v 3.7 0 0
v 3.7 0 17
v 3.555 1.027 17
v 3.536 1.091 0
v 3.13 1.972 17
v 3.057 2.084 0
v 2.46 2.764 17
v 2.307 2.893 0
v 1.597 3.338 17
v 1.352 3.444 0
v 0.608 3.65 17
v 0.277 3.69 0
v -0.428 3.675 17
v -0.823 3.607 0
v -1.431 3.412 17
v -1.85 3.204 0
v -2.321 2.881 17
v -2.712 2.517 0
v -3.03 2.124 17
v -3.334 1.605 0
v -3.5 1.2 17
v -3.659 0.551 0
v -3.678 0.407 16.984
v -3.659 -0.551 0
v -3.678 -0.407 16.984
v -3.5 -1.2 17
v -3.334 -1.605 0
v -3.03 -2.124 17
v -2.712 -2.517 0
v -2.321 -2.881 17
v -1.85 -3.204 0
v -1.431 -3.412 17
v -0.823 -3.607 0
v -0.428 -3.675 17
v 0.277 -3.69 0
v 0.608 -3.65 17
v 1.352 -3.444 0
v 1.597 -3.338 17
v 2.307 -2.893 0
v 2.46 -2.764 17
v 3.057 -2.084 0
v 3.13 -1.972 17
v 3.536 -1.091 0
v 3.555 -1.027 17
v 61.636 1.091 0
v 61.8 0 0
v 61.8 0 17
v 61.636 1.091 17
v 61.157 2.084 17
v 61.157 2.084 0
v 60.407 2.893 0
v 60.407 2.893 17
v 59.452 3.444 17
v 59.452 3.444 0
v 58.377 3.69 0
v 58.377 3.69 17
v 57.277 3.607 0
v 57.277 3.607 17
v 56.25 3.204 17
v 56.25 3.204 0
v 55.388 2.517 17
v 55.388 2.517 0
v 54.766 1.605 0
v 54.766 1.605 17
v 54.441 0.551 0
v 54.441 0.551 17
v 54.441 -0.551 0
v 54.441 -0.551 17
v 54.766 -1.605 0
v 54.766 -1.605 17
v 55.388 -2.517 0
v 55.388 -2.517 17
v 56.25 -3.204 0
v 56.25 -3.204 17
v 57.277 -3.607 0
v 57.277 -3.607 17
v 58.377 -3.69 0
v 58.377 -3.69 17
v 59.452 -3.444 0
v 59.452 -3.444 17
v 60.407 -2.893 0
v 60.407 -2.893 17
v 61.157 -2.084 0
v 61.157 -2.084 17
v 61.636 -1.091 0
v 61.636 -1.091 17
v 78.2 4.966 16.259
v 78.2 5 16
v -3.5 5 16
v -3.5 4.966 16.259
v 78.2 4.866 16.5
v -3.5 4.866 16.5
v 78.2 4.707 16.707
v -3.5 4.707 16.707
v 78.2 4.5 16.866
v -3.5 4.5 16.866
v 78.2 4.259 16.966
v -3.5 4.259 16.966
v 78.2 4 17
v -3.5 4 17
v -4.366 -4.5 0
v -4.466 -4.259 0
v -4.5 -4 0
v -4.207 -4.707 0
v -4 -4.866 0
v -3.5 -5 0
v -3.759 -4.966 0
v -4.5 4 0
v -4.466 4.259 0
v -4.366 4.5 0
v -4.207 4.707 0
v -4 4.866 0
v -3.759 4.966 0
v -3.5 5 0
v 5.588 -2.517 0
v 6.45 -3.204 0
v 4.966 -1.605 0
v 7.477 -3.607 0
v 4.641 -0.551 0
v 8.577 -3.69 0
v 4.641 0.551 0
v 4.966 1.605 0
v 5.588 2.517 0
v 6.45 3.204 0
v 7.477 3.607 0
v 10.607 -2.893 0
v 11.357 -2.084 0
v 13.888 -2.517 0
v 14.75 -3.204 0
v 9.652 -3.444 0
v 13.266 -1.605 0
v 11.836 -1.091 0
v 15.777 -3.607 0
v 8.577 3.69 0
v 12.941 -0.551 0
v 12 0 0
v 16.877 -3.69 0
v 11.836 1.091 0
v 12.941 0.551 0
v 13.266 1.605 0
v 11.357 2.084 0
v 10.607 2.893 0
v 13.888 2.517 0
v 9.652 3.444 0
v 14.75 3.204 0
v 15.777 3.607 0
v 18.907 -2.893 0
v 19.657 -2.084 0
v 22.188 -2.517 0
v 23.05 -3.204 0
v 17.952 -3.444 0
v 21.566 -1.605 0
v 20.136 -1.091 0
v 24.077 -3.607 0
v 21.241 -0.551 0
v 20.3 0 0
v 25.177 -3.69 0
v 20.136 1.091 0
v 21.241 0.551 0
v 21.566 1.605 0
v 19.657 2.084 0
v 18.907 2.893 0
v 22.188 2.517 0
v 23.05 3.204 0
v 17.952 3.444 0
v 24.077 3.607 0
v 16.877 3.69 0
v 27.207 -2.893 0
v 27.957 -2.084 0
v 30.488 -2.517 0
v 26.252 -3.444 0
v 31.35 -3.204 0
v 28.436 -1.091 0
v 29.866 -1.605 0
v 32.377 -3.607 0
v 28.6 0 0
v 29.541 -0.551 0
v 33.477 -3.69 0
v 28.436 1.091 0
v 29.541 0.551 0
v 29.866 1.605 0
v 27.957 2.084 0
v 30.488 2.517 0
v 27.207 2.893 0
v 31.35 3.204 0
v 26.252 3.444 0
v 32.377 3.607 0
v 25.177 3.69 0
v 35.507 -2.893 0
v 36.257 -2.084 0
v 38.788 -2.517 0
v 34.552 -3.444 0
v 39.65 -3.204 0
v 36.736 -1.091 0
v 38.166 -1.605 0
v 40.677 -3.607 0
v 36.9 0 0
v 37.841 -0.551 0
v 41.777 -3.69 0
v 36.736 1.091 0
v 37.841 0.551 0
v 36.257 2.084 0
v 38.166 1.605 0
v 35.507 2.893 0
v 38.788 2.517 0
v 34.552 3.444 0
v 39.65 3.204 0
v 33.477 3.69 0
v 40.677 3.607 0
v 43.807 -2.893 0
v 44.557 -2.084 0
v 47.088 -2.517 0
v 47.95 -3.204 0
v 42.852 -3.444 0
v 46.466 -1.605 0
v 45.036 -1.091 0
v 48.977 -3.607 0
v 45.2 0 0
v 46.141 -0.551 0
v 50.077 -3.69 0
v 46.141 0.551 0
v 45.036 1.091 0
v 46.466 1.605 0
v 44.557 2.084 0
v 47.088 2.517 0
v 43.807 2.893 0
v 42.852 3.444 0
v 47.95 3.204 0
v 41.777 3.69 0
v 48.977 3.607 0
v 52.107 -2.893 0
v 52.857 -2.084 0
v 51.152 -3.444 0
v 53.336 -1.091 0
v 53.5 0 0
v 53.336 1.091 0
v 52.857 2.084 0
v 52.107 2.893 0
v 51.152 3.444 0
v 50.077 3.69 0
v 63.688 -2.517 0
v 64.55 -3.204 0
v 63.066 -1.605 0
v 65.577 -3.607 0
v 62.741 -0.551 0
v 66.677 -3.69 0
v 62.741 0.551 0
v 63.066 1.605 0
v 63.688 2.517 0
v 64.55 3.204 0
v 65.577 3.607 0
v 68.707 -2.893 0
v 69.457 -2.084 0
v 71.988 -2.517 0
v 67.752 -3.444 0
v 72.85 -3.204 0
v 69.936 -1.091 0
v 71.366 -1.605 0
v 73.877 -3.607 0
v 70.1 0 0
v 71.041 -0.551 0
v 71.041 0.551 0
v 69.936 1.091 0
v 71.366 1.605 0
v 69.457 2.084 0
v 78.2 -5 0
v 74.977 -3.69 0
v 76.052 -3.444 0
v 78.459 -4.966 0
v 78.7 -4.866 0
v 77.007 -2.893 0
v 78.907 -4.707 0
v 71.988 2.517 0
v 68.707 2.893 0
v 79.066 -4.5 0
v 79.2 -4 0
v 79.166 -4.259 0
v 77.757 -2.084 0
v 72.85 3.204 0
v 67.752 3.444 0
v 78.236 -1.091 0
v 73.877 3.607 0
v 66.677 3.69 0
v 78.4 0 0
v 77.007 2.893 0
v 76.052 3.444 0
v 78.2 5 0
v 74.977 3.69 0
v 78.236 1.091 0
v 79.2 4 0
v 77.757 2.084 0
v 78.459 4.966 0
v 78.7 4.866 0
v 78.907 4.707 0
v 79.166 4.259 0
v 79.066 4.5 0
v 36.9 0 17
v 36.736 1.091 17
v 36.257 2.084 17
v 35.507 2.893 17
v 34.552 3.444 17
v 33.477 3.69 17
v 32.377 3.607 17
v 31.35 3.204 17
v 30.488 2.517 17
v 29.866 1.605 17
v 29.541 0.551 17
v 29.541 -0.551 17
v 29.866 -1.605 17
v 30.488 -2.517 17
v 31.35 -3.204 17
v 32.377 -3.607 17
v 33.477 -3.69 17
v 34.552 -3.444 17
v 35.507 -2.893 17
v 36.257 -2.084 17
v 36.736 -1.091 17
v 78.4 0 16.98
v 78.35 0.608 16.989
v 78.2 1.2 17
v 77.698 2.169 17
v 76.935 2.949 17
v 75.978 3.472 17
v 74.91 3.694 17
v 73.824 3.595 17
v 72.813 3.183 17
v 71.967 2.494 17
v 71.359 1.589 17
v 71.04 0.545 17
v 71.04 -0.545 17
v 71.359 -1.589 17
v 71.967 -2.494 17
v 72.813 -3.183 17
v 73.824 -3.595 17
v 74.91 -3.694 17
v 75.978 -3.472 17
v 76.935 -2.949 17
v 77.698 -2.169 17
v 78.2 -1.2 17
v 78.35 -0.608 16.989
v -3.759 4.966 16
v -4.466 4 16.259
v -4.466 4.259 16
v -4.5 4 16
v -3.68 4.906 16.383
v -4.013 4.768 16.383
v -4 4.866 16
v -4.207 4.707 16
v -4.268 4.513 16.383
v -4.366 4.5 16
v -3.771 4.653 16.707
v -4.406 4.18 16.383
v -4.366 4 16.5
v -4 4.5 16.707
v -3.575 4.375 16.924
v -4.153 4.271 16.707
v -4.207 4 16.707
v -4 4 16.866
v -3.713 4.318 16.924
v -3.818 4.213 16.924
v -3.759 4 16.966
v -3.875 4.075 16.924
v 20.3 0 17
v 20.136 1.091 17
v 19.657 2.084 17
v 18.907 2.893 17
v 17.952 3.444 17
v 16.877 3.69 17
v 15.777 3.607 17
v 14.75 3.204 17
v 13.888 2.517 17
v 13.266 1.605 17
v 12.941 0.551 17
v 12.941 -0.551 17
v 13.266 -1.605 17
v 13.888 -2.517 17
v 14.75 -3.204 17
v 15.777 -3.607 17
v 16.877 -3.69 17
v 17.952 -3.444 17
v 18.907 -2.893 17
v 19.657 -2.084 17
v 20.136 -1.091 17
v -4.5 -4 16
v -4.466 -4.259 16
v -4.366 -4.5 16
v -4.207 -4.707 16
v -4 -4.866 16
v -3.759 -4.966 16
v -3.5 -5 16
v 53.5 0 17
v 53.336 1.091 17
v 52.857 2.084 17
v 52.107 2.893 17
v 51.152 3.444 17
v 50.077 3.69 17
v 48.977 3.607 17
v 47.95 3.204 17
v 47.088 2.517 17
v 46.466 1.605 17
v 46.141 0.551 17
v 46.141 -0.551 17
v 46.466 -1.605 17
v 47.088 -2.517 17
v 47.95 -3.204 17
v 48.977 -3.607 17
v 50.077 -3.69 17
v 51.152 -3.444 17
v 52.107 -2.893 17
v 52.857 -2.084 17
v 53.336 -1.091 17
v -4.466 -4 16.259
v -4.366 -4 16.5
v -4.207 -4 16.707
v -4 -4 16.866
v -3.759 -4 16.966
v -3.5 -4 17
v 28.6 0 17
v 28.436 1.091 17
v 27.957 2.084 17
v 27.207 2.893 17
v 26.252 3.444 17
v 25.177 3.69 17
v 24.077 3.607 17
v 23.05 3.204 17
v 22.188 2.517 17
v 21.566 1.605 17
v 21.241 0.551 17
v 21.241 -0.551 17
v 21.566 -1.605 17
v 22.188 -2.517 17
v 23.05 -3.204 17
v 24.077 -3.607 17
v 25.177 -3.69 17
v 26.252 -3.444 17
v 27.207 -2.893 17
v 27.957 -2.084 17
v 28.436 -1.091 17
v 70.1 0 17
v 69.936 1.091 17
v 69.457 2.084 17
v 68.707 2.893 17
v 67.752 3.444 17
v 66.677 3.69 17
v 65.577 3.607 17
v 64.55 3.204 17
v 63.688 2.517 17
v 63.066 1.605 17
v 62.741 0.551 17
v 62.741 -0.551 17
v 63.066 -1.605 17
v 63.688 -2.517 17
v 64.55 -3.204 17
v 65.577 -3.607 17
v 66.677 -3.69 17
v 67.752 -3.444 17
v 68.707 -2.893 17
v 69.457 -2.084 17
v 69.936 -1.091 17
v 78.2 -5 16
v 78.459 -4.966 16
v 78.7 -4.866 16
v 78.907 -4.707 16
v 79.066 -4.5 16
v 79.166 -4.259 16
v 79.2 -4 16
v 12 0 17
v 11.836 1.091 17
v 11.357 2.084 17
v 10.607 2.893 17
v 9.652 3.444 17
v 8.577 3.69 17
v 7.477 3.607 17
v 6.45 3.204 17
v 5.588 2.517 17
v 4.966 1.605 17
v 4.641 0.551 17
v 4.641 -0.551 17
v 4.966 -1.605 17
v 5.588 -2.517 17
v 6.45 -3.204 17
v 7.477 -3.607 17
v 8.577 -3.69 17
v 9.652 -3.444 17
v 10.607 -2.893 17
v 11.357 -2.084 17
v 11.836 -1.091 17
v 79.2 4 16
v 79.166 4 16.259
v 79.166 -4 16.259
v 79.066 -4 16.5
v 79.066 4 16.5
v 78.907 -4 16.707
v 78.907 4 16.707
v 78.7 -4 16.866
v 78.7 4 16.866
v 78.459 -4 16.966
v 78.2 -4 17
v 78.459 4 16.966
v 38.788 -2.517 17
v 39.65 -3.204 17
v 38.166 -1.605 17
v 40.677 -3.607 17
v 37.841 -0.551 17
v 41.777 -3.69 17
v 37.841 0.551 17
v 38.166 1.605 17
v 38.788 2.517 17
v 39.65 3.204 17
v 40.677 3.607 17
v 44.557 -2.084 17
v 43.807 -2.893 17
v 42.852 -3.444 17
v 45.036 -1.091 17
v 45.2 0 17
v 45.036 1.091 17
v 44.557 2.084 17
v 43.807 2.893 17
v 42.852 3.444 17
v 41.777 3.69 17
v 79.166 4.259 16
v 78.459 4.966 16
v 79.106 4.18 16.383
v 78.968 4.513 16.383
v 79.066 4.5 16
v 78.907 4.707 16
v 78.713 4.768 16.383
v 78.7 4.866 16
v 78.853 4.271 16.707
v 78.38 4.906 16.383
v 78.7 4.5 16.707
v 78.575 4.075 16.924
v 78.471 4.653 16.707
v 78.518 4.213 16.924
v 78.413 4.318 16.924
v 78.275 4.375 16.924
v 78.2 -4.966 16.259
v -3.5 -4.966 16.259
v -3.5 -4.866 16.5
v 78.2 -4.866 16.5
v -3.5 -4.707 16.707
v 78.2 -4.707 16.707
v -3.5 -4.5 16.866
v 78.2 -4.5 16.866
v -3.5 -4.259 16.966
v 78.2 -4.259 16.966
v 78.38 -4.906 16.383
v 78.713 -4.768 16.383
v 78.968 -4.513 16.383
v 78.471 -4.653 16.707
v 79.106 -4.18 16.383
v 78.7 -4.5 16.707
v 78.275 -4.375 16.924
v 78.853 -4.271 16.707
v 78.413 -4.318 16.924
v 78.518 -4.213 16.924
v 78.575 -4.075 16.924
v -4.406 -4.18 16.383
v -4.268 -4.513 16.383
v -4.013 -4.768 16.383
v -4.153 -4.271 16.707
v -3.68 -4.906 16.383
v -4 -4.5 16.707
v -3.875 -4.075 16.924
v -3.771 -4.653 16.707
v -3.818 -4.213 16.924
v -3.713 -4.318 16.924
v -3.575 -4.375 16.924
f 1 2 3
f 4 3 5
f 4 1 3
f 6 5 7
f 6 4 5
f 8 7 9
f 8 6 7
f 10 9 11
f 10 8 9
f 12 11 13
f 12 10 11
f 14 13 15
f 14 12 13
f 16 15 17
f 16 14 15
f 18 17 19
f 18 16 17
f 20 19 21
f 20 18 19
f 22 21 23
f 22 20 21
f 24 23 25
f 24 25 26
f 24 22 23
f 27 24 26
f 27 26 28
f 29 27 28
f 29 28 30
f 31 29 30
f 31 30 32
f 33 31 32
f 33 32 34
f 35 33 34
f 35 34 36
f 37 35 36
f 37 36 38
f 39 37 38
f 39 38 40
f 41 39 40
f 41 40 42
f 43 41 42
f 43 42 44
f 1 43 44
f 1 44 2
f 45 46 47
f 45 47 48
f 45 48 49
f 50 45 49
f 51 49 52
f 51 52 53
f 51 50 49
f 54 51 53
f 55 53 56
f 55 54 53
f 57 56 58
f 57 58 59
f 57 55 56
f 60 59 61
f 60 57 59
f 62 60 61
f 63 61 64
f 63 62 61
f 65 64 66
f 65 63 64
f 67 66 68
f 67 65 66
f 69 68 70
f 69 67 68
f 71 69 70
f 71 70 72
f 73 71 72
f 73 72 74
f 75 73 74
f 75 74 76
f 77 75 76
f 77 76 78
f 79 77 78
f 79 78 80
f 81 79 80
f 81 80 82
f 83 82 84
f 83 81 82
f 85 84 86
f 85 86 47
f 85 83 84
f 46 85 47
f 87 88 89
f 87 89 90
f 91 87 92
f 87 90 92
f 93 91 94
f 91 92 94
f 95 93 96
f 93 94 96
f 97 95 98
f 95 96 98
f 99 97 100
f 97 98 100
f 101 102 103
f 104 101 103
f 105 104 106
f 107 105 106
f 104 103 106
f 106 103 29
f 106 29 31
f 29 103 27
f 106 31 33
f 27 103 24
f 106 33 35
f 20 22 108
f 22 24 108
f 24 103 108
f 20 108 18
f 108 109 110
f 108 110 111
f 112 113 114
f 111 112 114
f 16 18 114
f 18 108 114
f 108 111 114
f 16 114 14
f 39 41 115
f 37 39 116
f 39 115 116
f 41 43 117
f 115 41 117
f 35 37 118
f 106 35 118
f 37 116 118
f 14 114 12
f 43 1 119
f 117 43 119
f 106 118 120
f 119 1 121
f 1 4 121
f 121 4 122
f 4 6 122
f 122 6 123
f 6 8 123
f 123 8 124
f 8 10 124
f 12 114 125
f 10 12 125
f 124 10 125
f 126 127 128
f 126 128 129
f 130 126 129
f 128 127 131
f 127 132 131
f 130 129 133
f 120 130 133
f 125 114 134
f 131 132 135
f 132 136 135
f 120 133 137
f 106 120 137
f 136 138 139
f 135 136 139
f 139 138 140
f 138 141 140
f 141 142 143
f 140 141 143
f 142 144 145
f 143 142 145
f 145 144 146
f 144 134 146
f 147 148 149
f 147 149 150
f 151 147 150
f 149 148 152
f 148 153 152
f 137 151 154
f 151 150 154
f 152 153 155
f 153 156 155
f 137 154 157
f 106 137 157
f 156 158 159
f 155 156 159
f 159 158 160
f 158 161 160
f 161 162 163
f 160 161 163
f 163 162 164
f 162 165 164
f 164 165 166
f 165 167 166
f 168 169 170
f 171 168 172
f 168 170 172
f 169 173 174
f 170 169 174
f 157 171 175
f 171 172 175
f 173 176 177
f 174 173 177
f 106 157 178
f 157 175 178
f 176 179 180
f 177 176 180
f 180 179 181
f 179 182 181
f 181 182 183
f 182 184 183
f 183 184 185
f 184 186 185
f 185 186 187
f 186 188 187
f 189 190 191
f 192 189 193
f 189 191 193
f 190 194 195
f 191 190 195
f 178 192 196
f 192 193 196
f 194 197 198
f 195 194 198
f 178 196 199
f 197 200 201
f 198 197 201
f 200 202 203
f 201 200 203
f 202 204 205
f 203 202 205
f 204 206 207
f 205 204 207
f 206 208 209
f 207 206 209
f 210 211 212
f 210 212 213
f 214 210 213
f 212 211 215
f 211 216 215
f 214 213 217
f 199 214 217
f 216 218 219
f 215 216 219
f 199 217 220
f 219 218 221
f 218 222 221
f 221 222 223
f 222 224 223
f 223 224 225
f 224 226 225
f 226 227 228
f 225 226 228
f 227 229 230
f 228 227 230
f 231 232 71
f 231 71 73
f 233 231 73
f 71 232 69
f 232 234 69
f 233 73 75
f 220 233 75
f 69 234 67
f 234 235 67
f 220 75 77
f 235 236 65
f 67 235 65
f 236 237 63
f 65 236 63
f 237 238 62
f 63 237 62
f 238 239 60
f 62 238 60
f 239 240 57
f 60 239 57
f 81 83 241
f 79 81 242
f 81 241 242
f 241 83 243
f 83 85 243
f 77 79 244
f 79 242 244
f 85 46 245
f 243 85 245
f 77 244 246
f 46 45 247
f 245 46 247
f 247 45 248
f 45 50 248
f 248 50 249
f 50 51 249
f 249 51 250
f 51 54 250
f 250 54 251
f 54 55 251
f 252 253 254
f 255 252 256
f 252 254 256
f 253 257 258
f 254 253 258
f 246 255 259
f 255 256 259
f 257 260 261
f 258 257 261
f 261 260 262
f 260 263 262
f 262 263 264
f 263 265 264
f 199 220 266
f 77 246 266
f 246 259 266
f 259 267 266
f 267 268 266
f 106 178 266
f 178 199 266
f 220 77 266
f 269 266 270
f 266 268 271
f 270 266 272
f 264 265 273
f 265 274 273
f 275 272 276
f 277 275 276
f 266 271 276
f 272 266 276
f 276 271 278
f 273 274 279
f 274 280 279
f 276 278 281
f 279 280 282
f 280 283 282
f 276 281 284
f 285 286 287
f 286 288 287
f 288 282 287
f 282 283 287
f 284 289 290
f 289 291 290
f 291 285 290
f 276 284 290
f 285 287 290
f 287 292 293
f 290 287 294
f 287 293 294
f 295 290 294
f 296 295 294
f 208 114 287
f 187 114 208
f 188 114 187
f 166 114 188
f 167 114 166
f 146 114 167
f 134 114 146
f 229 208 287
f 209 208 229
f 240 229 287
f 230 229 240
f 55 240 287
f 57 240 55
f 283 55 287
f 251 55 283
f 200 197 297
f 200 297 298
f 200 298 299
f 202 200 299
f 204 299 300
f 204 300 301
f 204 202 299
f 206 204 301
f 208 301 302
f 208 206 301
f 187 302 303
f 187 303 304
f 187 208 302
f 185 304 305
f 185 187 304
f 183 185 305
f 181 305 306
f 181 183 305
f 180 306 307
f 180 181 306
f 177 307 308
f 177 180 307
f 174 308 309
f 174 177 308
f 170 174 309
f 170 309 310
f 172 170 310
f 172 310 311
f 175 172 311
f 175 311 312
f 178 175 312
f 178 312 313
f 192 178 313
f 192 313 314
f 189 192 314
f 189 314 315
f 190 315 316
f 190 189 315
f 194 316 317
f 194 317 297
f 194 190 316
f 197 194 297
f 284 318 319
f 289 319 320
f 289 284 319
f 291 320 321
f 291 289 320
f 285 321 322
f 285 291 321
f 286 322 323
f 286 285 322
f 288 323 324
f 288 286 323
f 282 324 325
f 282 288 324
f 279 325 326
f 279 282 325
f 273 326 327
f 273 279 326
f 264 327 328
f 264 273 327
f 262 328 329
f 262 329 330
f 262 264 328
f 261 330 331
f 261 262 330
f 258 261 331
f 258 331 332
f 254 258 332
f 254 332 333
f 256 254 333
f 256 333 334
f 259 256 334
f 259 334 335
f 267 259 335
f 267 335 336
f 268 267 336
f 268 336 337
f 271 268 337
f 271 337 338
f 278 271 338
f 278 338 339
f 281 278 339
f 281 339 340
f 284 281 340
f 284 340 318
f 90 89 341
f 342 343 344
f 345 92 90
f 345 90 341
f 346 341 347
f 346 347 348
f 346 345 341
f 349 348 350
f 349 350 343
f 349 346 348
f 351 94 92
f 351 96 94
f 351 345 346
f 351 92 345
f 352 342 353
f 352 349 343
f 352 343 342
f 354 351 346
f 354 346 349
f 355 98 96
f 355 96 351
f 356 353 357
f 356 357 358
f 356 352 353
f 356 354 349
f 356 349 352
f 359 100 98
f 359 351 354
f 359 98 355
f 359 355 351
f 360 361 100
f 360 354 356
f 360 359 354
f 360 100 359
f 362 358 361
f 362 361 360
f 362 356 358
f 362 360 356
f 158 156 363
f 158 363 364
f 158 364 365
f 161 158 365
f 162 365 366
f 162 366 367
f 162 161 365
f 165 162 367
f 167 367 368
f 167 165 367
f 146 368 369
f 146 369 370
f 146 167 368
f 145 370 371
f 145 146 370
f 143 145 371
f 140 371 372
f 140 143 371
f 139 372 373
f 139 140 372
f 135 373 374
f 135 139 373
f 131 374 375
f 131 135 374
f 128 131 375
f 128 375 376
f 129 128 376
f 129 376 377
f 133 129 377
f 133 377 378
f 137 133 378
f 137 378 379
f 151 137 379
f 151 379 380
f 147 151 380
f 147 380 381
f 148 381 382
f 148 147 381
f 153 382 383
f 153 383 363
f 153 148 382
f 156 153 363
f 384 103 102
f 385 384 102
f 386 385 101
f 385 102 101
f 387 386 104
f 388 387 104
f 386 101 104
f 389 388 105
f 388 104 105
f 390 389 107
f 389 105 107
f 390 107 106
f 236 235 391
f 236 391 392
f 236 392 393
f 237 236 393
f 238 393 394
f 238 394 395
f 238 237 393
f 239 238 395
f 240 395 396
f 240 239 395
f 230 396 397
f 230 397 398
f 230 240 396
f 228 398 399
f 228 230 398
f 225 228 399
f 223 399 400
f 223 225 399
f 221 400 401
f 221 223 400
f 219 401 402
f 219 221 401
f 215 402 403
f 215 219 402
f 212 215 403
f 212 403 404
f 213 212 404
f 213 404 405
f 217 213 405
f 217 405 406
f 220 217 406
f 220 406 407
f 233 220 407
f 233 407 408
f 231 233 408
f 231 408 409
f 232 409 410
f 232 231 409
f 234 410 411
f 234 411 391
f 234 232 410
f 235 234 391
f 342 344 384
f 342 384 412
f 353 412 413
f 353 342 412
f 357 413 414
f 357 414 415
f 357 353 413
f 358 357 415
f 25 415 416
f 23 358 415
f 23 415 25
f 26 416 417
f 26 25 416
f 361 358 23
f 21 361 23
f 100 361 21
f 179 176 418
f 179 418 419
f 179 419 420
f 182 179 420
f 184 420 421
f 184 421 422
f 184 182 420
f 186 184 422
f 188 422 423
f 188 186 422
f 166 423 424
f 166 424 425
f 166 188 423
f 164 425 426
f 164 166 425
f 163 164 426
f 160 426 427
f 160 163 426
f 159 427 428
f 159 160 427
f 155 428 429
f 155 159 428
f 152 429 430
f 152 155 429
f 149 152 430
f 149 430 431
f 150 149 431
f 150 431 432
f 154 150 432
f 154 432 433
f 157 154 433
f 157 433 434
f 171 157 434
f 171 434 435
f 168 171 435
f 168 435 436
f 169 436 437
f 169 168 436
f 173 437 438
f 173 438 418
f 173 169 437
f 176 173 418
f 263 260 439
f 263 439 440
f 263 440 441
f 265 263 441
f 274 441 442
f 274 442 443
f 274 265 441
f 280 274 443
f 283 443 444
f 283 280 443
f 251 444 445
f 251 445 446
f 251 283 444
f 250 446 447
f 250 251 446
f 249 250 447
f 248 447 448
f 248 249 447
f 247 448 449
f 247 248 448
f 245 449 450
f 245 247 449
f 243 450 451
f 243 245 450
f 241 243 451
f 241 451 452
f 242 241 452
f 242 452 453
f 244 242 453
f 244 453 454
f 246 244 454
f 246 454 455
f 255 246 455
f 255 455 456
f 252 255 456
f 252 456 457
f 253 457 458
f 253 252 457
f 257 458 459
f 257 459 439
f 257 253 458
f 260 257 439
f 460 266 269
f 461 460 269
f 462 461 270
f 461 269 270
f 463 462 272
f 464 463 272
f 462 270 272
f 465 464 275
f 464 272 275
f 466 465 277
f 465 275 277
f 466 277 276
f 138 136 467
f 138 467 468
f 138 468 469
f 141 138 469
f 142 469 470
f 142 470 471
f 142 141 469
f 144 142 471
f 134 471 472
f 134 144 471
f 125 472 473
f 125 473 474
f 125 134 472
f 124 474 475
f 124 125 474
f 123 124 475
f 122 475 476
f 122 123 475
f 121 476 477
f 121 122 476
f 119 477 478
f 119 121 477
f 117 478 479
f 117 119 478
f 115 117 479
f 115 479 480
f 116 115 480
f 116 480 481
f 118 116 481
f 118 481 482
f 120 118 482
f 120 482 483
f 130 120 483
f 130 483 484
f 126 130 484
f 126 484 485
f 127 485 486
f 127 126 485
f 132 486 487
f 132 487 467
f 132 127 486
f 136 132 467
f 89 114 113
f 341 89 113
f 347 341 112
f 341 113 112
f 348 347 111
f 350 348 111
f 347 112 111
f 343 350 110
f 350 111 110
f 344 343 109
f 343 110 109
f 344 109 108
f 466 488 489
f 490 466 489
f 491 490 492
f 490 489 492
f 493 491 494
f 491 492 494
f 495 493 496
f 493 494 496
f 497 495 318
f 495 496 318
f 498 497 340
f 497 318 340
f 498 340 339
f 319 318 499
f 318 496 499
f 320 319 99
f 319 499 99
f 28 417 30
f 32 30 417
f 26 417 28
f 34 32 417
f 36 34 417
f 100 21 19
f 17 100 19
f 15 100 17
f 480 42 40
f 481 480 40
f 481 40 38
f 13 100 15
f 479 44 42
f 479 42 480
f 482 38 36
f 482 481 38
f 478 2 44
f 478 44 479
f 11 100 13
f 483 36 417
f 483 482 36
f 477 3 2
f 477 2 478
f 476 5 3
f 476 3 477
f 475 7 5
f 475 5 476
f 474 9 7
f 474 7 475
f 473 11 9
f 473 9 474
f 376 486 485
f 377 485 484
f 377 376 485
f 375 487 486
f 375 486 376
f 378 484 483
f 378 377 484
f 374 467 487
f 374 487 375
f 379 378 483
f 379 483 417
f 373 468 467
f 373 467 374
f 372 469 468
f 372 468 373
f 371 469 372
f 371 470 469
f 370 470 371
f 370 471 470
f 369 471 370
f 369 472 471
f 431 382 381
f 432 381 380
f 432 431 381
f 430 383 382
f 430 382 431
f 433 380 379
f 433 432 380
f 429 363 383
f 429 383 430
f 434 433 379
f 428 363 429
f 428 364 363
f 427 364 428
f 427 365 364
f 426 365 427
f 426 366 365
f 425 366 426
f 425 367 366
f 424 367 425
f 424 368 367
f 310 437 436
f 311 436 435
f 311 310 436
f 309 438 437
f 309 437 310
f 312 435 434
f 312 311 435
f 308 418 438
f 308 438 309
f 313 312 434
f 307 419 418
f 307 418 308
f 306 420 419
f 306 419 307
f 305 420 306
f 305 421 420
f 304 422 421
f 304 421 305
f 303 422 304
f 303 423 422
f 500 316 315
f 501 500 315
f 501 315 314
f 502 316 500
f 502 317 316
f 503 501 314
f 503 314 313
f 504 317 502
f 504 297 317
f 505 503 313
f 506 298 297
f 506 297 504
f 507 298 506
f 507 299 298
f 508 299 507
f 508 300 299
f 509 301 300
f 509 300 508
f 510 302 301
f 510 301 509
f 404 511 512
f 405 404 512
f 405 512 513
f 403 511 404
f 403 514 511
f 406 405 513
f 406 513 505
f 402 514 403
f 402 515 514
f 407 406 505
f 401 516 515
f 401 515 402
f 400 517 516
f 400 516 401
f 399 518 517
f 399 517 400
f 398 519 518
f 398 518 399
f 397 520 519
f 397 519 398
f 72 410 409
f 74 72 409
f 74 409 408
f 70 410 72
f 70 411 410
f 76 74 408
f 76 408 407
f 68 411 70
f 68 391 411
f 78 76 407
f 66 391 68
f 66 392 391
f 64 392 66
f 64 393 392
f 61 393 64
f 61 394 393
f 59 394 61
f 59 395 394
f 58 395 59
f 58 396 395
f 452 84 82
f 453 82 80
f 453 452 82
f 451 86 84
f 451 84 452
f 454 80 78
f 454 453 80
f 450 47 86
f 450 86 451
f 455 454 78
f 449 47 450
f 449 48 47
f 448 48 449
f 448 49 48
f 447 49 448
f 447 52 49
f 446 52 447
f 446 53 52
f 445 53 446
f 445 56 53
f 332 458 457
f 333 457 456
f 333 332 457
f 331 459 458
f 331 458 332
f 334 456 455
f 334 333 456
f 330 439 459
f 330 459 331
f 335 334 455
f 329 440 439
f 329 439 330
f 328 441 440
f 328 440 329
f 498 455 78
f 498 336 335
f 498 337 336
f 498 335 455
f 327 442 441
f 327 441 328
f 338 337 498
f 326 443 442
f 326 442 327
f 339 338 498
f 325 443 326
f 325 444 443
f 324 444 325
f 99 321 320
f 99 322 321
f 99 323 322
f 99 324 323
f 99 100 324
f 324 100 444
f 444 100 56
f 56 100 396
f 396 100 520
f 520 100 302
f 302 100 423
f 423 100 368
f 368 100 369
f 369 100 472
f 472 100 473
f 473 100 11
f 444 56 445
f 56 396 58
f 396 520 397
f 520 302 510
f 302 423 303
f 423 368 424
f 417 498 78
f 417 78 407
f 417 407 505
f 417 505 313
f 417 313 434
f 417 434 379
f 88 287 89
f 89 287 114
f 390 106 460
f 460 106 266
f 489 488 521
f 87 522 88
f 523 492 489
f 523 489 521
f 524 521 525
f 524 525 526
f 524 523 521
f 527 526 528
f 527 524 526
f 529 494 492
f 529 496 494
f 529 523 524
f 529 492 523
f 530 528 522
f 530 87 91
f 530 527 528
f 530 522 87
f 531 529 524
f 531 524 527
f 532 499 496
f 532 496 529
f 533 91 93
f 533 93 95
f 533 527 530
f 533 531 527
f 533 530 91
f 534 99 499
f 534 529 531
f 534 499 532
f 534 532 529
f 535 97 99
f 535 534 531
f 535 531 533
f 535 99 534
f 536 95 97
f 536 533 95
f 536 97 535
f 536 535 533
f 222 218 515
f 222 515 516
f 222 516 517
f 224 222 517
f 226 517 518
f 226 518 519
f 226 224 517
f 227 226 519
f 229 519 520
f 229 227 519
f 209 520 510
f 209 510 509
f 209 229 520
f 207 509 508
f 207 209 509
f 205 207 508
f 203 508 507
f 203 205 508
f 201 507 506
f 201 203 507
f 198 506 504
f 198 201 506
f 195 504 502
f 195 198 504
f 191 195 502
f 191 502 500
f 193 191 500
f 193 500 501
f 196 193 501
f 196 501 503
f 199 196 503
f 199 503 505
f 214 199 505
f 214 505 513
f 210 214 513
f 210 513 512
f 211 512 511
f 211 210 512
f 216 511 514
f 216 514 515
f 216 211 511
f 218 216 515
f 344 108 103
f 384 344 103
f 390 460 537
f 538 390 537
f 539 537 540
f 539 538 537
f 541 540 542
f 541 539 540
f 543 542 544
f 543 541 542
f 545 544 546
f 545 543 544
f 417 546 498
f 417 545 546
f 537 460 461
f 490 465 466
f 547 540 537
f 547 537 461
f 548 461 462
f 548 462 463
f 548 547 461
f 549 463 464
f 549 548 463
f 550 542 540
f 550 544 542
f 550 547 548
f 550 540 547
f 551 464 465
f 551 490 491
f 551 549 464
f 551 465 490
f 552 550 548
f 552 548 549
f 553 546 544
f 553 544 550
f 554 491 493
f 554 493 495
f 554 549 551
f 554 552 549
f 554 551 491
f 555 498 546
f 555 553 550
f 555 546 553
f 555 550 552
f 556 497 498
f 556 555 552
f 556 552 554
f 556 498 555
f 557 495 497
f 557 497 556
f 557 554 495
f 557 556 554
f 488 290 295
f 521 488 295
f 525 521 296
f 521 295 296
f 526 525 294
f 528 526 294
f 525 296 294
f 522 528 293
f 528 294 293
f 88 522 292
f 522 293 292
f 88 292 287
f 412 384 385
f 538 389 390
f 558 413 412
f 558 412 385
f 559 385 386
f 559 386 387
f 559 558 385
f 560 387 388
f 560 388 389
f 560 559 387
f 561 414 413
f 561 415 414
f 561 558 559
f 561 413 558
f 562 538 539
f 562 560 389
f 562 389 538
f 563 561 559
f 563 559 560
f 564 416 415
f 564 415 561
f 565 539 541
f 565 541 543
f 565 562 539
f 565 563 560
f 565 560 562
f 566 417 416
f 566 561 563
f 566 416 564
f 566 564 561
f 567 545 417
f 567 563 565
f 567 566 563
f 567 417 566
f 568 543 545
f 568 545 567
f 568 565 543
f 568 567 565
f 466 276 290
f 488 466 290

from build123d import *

# Parameters (mm, degrees)
F0_R         = 3.7
F1_DEPTH     = 17
F2_T1_DEPTH  = 81.7
F2_T3_DEPTH  = 8
F2_T6_ANGLE  = 90
F2_T8_ANGLE  = 90
F2_T10_ANGLE = 90
F2_T12_ANGLE = 90


# Not quite as in the source:
# - a fillet or chamfer that OpenCascade refuses, or shapes differently, is made with other operations: its cross-section is extruded or revolved along the edge and cut away or added


with BuildPart() as f1:
    # F0 (on Top) → F1 (new body)
    with BuildSketch(Plane.XY):
        with BuildLine():
            ThreePointArc((-4.5, -4), (-4.2071067812, -4.7071067812), (-3.5, -5))
            Line((-3.5, -5), (78.2, -5))
            ThreePointArc((78.2, -5), (78.9071067812, -4.7071067812), (79.2, -4))
            Line((79.2, -4), (79.2, 4))
            ThreePointArc((79.2, 4), (78.9071067812, 4.7071067812), (78.2, 5))
            Line((78.2, 5), (-3.5, 5))
            ThreePointArc((-3.5, 5), (-4.2071067812, 4.7071067812), (-4.5, 4))
            Line((-4.5, 4), (-4.5, -4))
        make_face()
        Circle(F0_R, mode=Mode.SUBTRACT)
        with Locations((8.3, 0)):
            Circle(F0_R, mode=Mode.SUBTRACT)
        with Locations((16.6, 0)):
            Circle(F0_R, mode=Mode.SUBTRACT)
        with Locations((24.9, 0)):
            Circle(F0_R, mode=Mode.SUBTRACT)
        with Locations((33.2, 0)):
            Circle(F0_R, mode=Mode.SUBTRACT)
        with Locations((41.5, 0)):
            Circle(F0_R, mode=Mode.SUBTRACT)
        with Locations((49.8, 0)):
            Circle(F0_R, mode=Mode.SUBTRACT)
        with Locations((58.1, 0)):
            Circle(F0_R, mode=Mode.SUBTRACT)
        with Locations((66.4, 0)):
            Circle(F0_R, mode=Mode.SUBTRACT)
        with Locations((74.7, 0)):
            Circle(F0_R, mode=Mode.SUBTRACT)
    extrude(amount=F1_DEPTH)

    # F2: fillet of radius 1 on 8 edges, made by hand

    # F2_s2 → F2_t1 (cut)
    with BuildSketch(Plane.YZ.offset(-3.5)):
        with BuildLine():
            ThreePointArc((-5, 16), (-4.7071067812, 16.7071067812), (-4, 17))
            Line((-4, 17), (-5, 17))
            Line((-5, 17), (-5, 16))
        make_face()
        with BuildLine():
            ThreePointArc((5, 16), (4.7071067812, 16.7071067812), (4, 17))
            Line((4, 17), (5, 17))
            Line((5, 17), (5, 16))
        make_face()
    extrude(amount=F2_T1_DEPTH, mode=Mode.SUBTRACT)

    # F2_s4 → F2_t3 (cut)
    with BuildSketch(Plane.XZ.offset(-4)):
        with BuildLine():
            ThreePointArc((79.2, 16), (78.9071067812, 16.7071067812), (78.2, 17))
            Line((78.2, 17), (79.2, 17))
            Line((79.2, 17), (79.2, 16))
        make_face()
        with BuildLine():
            ThreePointArc((-4.5, 16), (-4.2071067812, 16.7071067812), (-3.5, 17))
            Line((-3.5, 17), (-4.5, 17))
            Line((-4.5, 17), (-4.5, 16))
        make_face()
    extrude(amount=F2_T3_DEPTH, mode=Mode.SUBTRACT)

    # F2_s5 → F2_t6 (revolve, cut)
    with BuildSketch(Plane.XZ.offset(4)):
        with BuildLine():
            ThreePointArc((-4.5, 16), (-4.2071067812, 16.7071067812), (-3.5, 17))
            Line((-3.5, 17), (-4.5, 17))
            Line((-4.5, 17), (-4.5, 16))
        make_face()
    revolve(axis=Axis((-3.5, -4, 17), (0, 0, 1)), revolution_arc=F2_T6_ANGLE, mode=Mode.SUBTRACT)

    # F2_s7 → F2_t8 (revolve, cut)
    with BuildSketch(Plane.YZ.offset(78.2)):
        with BuildLine():
            ThreePointArc((-5, 16), (-4.7071067812, 16.7071067812), (-4, 17))
            Line((-4, 17), (-5, 17))
            Line((-5, 17), (-5, 16))
        make_face()
    revolve(axis=Axis((78.2, -4, 17), (0, 0, 1)), revolution_arc=F2_T8_ANGLE, mode=Mode.SUBTRACT)

    # F2_s9 → F2_t10 (revolve, cut)
    with BuildSketch(Plane.XZ.offset(-4)):
        with BuildLine():
            ThreePointArc((79.2, 16), (78.9071067812, 16.7071067812), (78.2, 17))
            Line((78.2, 17), (79.2, 17))
            Line((79.2, 17), (79.2, 16))
        make_face()
    revolve(axis=Axis((78.2, 4, 17), (0, 0, 1)), revolution_arc=F2_T10_ANGLE, mode=Mode.SUBTRACT)

    # F2_s11 → F2_t12 (revolve, cut)
    with BuildSketch(Plane.YZ.offset(-3.5)):
        with BuildLine():
            ThreePointArc((5, 16), (4.7071067812, 16.7071067812), (4, 17))
            Line((4, 17), (5, 17))
            Line((5, 17), (5, 16))
        make_face()
    revolve(axis=Axis((-3.5, 4, 17), (0, 0, 1)), revolution_arc=F2_T12_ANGLE, mode=Mode.SUBTRACT)


solid = f1.part
